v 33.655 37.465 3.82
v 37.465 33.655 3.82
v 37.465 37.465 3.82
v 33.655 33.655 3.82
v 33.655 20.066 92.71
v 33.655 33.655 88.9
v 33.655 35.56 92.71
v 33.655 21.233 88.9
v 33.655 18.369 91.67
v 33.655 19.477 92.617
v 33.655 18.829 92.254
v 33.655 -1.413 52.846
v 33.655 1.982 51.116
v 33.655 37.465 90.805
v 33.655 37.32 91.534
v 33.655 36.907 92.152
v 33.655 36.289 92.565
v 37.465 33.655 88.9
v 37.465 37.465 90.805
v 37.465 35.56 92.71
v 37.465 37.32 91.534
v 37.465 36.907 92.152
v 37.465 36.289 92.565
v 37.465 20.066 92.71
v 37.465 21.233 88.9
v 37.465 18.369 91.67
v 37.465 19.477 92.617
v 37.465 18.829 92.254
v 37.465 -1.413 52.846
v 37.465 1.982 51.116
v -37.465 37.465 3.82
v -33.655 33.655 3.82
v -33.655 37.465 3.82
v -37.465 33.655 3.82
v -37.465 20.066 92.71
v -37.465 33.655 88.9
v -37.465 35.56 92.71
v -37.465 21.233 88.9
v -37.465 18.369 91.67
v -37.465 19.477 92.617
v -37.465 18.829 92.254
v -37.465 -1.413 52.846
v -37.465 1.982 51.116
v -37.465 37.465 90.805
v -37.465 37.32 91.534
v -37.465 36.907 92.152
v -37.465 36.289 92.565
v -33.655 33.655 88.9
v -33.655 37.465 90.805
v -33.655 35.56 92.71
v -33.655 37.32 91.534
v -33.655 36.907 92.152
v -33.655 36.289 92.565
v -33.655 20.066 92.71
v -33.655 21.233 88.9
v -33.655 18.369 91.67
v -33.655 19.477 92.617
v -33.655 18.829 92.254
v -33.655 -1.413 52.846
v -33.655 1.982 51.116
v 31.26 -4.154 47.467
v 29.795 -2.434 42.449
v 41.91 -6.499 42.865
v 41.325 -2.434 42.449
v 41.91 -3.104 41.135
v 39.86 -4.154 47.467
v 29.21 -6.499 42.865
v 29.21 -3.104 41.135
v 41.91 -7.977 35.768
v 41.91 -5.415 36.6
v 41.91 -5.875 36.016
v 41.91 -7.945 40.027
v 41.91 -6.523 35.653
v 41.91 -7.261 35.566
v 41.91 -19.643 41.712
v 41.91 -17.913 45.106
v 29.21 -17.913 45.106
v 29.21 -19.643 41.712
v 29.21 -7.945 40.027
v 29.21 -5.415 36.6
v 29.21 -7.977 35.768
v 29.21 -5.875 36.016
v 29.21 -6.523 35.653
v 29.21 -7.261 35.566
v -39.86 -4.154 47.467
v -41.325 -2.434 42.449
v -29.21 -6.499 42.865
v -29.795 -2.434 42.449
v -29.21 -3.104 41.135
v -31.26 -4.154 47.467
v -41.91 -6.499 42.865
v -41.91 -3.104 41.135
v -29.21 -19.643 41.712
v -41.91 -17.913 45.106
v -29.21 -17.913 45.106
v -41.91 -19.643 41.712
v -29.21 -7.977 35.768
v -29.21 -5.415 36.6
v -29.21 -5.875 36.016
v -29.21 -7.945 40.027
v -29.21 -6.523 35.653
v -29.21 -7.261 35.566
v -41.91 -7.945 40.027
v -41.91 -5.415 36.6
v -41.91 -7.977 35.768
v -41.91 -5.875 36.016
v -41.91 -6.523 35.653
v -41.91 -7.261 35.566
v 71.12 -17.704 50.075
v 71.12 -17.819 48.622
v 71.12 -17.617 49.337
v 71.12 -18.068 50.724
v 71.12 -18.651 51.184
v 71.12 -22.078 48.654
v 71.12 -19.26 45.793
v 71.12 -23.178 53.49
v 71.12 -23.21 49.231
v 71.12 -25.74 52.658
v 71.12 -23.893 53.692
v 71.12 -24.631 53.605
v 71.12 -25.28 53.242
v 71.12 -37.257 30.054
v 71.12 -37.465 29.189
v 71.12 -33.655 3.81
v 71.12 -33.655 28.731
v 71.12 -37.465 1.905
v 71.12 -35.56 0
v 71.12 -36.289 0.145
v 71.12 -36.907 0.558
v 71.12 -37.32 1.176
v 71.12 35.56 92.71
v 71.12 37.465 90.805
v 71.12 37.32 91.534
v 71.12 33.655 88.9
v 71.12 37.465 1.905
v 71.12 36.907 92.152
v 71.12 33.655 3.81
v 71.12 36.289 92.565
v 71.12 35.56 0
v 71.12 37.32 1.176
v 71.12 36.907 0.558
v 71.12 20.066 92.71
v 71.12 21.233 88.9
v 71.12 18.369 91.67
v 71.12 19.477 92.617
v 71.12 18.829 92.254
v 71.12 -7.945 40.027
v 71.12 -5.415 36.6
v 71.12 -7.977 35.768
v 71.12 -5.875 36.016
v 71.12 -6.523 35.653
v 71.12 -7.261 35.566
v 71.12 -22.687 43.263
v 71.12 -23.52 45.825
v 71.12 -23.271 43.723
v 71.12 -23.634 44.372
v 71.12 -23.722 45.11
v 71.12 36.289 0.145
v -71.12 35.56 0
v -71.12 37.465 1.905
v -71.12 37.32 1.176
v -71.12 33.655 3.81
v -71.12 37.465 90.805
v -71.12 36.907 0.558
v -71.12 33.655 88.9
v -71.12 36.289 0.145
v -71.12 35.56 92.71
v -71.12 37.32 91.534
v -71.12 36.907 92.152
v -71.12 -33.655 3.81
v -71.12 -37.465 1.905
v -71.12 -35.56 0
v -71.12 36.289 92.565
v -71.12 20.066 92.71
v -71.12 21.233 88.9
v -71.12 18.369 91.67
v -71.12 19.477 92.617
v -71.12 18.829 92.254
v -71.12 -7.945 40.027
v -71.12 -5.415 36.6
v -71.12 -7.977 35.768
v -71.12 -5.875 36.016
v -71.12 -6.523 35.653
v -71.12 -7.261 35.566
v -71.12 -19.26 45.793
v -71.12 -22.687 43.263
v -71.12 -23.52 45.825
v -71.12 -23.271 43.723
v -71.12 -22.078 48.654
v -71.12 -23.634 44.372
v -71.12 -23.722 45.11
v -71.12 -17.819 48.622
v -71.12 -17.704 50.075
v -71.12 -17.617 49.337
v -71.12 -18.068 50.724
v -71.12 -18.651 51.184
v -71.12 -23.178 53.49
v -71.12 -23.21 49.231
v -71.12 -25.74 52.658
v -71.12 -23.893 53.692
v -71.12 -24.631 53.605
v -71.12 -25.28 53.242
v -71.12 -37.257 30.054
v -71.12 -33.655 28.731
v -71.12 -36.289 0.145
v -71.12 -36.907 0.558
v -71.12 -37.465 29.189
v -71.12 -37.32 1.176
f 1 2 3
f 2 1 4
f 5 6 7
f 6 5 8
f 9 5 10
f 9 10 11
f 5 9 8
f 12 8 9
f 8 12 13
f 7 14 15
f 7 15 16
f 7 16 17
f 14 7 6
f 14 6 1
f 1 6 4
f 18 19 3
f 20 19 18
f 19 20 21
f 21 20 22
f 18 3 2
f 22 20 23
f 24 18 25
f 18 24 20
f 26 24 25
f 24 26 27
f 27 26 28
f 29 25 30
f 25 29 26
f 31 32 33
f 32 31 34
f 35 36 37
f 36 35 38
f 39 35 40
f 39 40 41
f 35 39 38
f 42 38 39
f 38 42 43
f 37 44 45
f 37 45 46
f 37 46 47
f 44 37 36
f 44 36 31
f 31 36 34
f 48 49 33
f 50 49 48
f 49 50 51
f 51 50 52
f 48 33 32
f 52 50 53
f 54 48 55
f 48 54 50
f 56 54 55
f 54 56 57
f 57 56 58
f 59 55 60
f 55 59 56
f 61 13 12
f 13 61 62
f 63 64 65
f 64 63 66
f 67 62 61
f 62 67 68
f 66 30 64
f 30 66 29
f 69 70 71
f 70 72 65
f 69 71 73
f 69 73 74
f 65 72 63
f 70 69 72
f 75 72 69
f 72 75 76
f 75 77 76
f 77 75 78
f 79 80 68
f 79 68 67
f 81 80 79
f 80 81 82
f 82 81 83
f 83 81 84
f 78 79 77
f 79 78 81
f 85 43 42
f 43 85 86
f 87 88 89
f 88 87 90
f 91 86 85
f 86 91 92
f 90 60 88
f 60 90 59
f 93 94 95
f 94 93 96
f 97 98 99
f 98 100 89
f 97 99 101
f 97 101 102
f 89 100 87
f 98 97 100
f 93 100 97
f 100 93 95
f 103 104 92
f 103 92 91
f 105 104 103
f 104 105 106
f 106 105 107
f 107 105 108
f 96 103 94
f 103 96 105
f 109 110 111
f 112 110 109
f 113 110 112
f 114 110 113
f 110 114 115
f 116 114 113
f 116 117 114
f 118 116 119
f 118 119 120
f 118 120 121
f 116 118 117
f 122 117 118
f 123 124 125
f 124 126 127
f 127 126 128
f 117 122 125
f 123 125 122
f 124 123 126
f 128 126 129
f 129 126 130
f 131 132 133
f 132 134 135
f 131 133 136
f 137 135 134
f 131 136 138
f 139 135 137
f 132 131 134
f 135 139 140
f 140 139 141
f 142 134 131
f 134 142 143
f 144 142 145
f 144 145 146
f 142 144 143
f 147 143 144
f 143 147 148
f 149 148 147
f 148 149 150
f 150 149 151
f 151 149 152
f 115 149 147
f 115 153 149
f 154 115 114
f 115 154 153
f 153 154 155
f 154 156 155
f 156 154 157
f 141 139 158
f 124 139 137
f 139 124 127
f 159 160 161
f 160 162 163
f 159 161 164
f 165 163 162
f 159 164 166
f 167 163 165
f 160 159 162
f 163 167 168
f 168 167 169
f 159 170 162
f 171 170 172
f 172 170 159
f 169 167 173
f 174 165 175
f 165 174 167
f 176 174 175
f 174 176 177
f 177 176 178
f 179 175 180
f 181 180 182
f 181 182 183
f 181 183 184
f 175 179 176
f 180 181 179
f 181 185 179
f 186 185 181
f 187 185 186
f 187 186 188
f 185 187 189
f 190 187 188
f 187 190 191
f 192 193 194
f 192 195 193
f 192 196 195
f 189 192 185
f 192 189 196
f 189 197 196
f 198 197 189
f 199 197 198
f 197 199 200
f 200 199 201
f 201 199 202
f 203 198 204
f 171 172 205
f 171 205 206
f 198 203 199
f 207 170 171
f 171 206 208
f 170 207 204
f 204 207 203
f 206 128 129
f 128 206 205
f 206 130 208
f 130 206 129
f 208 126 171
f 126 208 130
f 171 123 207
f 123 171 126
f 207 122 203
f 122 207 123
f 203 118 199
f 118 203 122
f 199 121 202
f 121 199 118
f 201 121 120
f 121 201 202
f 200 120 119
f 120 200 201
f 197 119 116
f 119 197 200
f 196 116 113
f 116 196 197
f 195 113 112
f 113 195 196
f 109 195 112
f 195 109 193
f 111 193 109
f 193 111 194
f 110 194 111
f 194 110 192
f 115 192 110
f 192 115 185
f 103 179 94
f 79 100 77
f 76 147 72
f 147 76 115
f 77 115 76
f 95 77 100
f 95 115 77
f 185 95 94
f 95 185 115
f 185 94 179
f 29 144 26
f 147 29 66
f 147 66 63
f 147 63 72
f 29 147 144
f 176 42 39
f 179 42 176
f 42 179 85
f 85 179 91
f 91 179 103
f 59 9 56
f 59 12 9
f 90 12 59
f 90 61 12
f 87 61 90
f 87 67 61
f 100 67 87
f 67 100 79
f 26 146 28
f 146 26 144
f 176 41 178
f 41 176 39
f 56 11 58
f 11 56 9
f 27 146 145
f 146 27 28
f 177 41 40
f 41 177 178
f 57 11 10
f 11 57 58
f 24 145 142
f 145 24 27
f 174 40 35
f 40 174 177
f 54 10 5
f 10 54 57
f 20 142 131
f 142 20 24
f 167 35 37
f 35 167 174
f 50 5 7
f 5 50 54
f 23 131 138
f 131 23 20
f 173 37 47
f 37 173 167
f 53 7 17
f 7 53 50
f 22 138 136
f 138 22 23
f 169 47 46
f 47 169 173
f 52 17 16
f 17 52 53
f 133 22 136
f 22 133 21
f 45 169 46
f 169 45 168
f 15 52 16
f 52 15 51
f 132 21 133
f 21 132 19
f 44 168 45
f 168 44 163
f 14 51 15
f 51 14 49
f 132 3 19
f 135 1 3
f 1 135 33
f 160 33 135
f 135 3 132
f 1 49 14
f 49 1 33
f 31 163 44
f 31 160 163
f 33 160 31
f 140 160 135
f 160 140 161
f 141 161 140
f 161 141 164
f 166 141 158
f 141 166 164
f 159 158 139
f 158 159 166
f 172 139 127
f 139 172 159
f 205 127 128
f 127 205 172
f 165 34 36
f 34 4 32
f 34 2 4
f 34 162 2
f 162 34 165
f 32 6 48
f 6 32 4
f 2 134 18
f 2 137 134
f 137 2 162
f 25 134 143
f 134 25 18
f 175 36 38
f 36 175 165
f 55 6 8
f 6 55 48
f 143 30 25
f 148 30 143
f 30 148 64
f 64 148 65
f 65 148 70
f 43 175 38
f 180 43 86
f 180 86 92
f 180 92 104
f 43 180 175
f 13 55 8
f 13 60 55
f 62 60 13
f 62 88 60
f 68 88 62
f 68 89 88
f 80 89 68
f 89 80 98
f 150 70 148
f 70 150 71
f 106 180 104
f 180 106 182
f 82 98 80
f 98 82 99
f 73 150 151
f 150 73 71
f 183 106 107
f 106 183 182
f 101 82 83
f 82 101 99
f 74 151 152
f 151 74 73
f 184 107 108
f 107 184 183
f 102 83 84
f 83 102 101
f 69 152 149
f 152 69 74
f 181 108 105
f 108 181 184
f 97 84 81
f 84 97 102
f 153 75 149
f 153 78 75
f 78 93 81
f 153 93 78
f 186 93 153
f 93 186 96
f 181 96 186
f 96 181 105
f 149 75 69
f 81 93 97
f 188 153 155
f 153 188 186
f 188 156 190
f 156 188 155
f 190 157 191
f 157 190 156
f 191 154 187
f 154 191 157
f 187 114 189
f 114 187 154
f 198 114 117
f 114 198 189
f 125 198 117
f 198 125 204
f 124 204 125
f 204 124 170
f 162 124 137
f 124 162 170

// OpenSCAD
// 
// Customizable Phone Stand
// version 1.0   11/21/2015
// by Steve Van Ausdall (DaoZenCiaoYen @ Thingiverse)
//

// preview[view:west, tilt:top diagonal]

/* [Main] */
// in inches
stand_height = 3.5 ; // [2:0.1:5]
// in inches
stand_width = 2.8 ; // [2:0.1:5]
// in inches
stand_depth = 2.8 ; // [2:0.1:5]
// in inches
phone_depth = 0.5 ; // [0.3:0.1:1]
// in inches
phone_lip = 0.2 ; // [0:0.1:0.5]
// in degrees
phone_angle = 27 ; // [10:35]
// in percent of stand depth
phone_adjust_depth_pct = 10 ; // [-20:1:10]
// in percent of stand height
phone_adjust_height_pct = -10 ; // [-20:1:10]
// the hole for the charger connetor in inches
charger_width = 0.5 ; // [0:0.1:1.5]
// the width of the charger cord in inches
cord_width = 0.15 ; // [0:0.05:1.5]
// in percent of possible height
slot_taper_pct = 30 ; // [0:5:100]
// in inches
wall_thickness = 0.15 ; // [0.1:0.05:0.5]
// number of phones
phone_count = 2; // [1:1:10]

/* [Hidden] */
mm_in = 25.4 ;
thick = mm(wall_thickness) ;
phone_y = (stand_height/2) + (phone_adjust_height_pct*stand_height/100) ;
phone_x = (stand_depth/2) + (phone_adjust_depth_pct*stand_depth/100) ;
slot_taper = (stand_height - phone_y) * slot_taper_pct/100 ;
ff = 0.01 ;
bf = 1 ;
$fn=16 ;

function mm(in) = in * mm_in ;

main();

module main()
{
  render(convexity = 3)
  {
    rotate_z(2)
    {
      difference()
      {
        stand();
        cord_slots();
        charger_slots();
      }
    }
  }
}

module rotate_z(yn)
{
  if (yn == 0) 
  {
    children(0);
  }
  else if (yn == 1)
  {
    rotate([0,0,180])
      translate([mm(-stand_depth/2),mm(-stand_height/2)-thick/2,mm(stand_width/2)])
      children(0);
  }
  else 
  {
    rotate([0,0,-90])
      translate([mm(-stand_depth/2),0,thick/2])
      rotate([90,0,0])
      children(0) ;
  }
}

module cord_slots()
{
  for (slot = [0:phone_count-1])
    cord_slot(slot);
}

module cord_slot(slot)
{
  offset = (stand_width * slot) - ((phone_count - 1) * stand_width * 0.5);
  translate([-thick,thick*1.5+ff,mm(offset -cord_width/2)])
    linear_extrude(height=mm(cord_width)) 
    offset(thick) 
    cord_slot_shape();
}

module charger_slots()
{
  for (slot = [0:phone_count-1])
    charger_slot(slot);
}

module charger_slot(slot)
{
  offset = (stand_width * slot) - ((phone_count - 1) * stand_width * 0.5);
  translate([mm(phone_x)-thick/2,mm(phone_y)-thick,mm(offset)])
    rotate([0,0,phone_angle])
    rotate([0,90,0])
    linear_extrude(height=mm(phone_depth)+thick+ff)
    polygon(points=[
      [0,mm(slot_taper)+thick*2],
      [mm(charger_width/2),thick*2],[mm(charger_width/2),0],
      [-mm(charger_width/2),0],[-mm(charger_width/2),thick*2]
    ]);
}

module stand()
{
  translate([0,0,mm(-(stand_width * phone_count) /2)])
    linear_extrude(height=mm(stand_width * phone_count)) 
    stand_outline();
}

module stand_outline()
{
  difference()
  {
    offset(r=thick/2) stand_shape();
    offset(r=-thick/2) stand_shape();
  }
}

module cord_slot_shape()
{
  square([mm(phone_x)+thick/2,mm(stand_height)]);
}

module stand_shape()
{
  difference()
  {
    square([mm(stand_depth),mm(stand_height)]);
    translate([mm(phone_x),mm(phone_y)])
      rotate([0,0,phone_angle])
      translate([0,mm(-phone_y-bf)])
      difference()
      {
        square([mm(stand_depth+bf),mm(stand_height+bf*2)]);
        square([mm(phone_depth)+thick,mm(phone_y+bf)]);
        translate([mm(phone_depth)+thick,0])
          square([mm(phone_lip),mm(phone_y+bf+phone_lip)]);
      };
  }
}
